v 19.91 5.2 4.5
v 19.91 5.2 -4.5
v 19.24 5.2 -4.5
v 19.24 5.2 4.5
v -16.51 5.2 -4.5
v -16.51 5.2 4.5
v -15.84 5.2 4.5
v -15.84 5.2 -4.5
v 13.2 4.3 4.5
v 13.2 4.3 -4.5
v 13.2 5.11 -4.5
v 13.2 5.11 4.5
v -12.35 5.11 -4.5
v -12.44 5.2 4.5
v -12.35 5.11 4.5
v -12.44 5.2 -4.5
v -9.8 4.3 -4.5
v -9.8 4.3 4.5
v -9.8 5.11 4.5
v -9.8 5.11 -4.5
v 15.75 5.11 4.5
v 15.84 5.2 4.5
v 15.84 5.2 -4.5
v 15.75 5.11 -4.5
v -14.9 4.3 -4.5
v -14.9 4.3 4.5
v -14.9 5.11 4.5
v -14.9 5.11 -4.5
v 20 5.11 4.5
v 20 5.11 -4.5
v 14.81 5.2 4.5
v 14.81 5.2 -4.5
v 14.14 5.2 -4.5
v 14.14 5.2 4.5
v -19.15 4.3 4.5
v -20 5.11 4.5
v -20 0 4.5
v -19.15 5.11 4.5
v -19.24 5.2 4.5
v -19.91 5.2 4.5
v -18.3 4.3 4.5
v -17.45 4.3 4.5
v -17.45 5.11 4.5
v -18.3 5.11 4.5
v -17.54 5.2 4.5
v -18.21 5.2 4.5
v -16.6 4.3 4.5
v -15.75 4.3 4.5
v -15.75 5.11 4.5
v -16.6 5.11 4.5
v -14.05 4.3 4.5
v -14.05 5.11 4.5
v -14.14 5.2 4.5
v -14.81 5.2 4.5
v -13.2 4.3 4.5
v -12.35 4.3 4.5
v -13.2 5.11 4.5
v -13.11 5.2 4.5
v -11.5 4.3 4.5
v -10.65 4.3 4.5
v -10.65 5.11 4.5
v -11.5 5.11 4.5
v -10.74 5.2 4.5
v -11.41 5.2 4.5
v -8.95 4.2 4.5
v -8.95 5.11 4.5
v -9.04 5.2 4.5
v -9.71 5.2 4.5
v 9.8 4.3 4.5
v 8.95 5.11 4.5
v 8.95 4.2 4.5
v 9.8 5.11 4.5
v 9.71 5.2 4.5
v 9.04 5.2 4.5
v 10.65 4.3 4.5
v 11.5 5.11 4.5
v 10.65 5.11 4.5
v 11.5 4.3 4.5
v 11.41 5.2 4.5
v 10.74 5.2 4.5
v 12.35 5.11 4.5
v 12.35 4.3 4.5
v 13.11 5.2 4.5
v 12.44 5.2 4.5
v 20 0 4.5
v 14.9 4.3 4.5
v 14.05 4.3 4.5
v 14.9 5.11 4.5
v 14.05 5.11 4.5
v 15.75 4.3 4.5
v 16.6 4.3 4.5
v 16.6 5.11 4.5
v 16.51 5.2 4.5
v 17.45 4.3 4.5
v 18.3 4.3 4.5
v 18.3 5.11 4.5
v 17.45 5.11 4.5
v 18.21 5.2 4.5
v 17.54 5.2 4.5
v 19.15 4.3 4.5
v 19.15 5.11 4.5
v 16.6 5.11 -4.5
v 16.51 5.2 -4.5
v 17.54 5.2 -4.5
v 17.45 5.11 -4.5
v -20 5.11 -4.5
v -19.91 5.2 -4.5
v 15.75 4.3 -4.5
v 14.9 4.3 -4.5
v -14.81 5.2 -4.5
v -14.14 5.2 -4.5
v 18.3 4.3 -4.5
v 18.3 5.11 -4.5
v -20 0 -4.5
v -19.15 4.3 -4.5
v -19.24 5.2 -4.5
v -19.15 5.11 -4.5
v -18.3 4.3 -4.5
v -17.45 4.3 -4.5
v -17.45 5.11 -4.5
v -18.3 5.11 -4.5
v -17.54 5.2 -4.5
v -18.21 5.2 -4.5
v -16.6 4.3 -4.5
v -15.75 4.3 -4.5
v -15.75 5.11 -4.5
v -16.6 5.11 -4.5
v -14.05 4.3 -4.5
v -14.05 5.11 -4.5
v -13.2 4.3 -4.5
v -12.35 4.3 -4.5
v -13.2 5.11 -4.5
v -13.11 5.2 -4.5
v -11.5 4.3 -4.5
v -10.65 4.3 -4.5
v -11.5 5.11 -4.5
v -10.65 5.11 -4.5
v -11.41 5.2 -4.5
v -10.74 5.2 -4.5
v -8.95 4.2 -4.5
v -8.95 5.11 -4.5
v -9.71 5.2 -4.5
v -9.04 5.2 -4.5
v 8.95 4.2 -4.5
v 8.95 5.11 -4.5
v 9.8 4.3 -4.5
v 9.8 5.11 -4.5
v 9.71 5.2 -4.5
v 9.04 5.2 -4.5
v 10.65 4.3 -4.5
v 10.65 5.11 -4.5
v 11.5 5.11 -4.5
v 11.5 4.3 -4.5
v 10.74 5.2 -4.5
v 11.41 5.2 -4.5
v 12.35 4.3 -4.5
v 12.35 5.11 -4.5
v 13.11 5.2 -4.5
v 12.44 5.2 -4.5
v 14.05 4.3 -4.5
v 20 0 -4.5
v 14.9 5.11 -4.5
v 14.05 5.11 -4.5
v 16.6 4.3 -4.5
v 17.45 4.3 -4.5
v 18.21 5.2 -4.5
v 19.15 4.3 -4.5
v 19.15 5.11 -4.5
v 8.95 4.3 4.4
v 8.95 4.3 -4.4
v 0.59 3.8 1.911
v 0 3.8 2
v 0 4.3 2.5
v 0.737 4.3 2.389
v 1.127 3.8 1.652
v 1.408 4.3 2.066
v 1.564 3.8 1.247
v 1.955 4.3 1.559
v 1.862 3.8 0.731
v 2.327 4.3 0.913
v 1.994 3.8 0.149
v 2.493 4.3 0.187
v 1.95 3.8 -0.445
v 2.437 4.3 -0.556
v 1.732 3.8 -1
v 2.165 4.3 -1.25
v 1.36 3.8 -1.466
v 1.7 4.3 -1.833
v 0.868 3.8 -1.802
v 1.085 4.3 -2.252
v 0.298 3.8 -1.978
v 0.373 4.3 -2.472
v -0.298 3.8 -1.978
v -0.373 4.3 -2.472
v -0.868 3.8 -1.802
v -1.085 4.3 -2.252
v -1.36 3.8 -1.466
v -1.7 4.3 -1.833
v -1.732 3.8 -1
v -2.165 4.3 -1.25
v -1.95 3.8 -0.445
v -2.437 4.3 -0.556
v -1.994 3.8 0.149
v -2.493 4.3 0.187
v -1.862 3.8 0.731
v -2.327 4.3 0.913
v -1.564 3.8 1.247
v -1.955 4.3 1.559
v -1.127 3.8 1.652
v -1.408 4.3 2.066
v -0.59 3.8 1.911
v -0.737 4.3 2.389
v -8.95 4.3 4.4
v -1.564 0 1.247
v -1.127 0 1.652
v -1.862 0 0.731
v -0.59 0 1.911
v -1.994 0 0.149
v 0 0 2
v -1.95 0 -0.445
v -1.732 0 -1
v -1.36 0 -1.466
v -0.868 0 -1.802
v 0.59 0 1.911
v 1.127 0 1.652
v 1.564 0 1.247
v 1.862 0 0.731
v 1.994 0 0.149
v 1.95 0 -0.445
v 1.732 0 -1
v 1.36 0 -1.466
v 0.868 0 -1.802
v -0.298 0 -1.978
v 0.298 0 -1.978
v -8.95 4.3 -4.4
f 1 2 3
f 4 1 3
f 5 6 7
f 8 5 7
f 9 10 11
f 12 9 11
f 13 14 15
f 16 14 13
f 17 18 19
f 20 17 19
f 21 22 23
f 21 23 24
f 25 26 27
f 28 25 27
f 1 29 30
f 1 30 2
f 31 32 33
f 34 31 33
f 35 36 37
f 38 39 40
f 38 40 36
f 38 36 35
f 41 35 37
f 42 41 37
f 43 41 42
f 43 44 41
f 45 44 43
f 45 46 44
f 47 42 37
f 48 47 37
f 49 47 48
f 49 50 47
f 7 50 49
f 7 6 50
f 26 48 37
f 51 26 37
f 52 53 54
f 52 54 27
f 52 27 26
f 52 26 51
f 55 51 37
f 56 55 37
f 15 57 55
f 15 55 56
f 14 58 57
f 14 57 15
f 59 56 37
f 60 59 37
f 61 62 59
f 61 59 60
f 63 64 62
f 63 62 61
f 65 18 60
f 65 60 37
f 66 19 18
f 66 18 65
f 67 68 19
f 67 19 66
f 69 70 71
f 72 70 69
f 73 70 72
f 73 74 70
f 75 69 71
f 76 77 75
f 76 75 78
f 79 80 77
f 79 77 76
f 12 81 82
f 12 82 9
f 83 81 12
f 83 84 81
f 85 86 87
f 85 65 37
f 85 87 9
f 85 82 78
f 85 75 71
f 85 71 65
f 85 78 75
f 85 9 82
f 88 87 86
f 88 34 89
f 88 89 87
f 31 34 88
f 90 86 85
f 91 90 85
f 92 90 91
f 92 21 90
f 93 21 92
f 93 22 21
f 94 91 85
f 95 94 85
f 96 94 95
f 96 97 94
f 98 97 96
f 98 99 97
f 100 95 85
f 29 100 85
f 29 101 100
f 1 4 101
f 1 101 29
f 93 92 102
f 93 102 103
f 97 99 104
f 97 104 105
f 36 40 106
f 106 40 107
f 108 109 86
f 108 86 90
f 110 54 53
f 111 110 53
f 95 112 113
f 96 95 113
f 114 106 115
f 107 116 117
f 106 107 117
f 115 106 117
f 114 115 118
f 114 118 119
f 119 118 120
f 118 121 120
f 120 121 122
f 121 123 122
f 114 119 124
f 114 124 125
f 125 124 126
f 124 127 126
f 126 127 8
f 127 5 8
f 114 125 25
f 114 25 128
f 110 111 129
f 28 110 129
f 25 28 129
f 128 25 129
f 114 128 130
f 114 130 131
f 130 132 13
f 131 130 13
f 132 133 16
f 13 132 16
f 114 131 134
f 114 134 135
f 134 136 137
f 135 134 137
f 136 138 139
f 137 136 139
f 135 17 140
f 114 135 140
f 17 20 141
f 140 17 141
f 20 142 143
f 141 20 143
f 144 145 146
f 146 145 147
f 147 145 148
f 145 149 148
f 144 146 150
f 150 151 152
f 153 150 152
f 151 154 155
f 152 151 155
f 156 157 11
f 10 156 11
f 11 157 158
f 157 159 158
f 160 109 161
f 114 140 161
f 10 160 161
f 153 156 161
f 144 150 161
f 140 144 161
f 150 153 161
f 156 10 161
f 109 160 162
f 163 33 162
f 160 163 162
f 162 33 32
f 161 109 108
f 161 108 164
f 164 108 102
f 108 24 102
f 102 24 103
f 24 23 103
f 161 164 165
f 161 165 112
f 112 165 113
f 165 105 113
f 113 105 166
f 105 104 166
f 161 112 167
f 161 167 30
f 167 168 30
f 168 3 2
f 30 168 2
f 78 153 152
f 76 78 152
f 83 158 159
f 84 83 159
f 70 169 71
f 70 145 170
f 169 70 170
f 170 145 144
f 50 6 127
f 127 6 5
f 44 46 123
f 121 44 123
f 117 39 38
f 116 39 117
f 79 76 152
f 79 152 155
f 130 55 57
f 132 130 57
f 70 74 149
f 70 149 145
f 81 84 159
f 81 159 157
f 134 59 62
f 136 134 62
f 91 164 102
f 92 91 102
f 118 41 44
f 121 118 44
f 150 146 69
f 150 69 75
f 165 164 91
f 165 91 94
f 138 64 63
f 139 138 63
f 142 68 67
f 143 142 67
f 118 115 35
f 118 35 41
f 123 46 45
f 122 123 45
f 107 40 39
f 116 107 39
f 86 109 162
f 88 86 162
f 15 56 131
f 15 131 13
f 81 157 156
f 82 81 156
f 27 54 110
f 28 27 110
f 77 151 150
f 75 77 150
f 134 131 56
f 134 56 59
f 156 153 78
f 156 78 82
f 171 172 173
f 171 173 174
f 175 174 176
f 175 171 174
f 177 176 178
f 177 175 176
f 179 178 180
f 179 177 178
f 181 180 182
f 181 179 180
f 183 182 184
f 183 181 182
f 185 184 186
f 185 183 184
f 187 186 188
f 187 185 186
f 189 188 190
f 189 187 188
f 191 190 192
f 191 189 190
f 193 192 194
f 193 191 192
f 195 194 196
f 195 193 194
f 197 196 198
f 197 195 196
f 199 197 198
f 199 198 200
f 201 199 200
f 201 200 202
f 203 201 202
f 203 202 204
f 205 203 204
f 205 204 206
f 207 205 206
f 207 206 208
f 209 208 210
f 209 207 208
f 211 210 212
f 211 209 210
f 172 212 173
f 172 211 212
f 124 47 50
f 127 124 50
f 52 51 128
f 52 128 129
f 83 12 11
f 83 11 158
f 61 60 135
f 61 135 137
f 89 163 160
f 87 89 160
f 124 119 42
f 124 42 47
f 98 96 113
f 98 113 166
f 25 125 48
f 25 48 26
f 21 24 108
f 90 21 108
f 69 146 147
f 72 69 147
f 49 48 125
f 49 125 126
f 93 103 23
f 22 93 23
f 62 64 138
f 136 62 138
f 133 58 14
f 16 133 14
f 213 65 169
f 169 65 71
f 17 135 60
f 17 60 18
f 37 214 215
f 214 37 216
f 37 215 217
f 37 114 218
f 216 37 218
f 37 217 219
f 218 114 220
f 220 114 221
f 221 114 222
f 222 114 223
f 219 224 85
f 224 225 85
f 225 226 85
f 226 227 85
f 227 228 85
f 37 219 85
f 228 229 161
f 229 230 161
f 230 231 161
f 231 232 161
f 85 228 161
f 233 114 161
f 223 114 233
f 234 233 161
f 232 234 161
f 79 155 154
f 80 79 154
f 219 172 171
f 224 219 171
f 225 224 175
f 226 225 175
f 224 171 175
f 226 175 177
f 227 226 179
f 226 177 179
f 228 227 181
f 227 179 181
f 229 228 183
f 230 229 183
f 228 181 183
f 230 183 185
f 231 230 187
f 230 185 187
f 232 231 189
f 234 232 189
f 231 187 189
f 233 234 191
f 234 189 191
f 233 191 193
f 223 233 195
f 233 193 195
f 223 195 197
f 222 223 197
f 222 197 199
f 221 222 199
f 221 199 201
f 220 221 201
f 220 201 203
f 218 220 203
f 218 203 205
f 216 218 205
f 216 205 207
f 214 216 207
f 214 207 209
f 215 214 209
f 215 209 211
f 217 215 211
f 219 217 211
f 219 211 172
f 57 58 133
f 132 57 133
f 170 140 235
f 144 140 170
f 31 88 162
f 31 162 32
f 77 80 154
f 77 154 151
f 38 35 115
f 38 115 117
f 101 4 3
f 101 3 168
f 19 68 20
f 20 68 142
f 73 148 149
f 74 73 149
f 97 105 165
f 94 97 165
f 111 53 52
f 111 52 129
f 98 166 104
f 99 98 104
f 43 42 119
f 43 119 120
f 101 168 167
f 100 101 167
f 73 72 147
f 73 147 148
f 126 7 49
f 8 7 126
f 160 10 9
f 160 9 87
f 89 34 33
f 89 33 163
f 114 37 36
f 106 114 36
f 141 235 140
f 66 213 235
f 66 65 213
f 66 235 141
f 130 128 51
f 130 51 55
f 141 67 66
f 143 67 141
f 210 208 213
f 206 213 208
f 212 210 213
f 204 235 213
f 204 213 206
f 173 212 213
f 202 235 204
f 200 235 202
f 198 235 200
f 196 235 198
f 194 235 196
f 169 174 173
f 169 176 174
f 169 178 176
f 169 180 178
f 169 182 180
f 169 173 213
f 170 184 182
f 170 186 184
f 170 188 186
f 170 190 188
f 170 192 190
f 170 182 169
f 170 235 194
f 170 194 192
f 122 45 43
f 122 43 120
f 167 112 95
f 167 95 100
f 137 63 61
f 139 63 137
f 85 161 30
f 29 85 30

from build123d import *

# Parameters (mm, degrees)
SKETCH_1_W                          = 40
SKETCH_1_H                          = 9
EXTRUDE_1_DEPTH                     = 4.3
SKETCH_2_W                          = 0.85
SKETCH_2_H                          = 0.9
EXTRUDE_2_DEPTH                     = 9
CHAMFER_1_SIZE                      = 0.09
PATTERN_LINEAR_10_COUNT             = 7
PATTERN_LINEAR_10_PITCH             = 1.7
CHAMFER_1_OF_PATTERN_LINEAR_10_SIZE = 0.09
MIRROR_START                        = -4.5
MIRROR_3_DEPTH                      = 9
SKETCH_4_R                          = 2
CUT_EXTRUDE_1_DEPTH                 = 21.946121359
CHAMFER_2_SIZE                      = 0.5
CHAMFER_3_SIZE                      = 0.1


# Read off the part's stored shape, not the designer's step: 鏡射3
with BuildPart() as part:
    # 草圖1 → 填料-伸長1 (new body)
    with BuildSketch(Plane(origin=(0, 0, 0), x_dir=(1, 0, 0), z_dir=(0, 1, 0))):
        Rectangle(SKETCH_1_W, SKETCH_1_H)
    extrude(amount=EXTRUDE_1_DEPTH)

    # 草圖2 → 填料-伸長2 (add)
    with BuildSketch(Plane.XY.offset(4.5)):
        with Locations((-19.575, 4.75)):
            Rectangle(SKETCH_2_W, SKETCH_2_H)
    extrude_2 = extrude(amount=-EXTRUDE_2_DEPTH)

    # 導角1
    chamfer_1_edges = [part.edges().sort_by_distance(p)[0] for p in [
        (-20, 5.2, 0),
        (-19.15, 5.2, 0),
    ]]
    chamfer(chamfer_1_edges, length=CHAMFER_1_SIZE)

    # 直線複製排列10: 填料-伸長2 ×7
    with Locations(*[(i * PATTERN_LINEAR_10_PITCH, 0, 0) for i in range(1, PATTERN_LINEAR_10_COUNT)]):
        add(extrude_2)

    # 導角1 of 直線複製排列10
    chamfer_1_of_pattern_linear_10_edges = [part.edges().sort_by_distance(p)[0] for p in [
        (-18.3, 5.2, 0),
        (-17.45, 5.2, 0),
        (-16.6, 5.2, 0),
        (-15.75, 5.2, 0),
        (-14.9, 5.2, 0),
        (-14.05, 5.2, 0),
        (-13.2, 5.2, 0),
        (-12.35, 5.2, 0),
        (-11.5, 5.2, 0),
        (-10.65, 5.2, 0),
        (-9.8, 5.2, 0),
        (-8.95, 5.2, 0),
    ]]
    chamfer(chamfer_1_of_pattern_linear_10_edges, length=CHAMFER_1_OF_PATTERN_LINEAR_10_SIZE)

    # 鏡射3 outline → 鏡射3 (add)
    with BuildSketch(Plane.XY.offset(MIRROR_START)):
        Polygon((8.95, 4.3), (9.8, 4.3), (9.8, 5.11), (9.71, 5.2), (9.04, 5.2), (8.95, 5.11), align=None)
        Polygon((10.65, 4.3), (11.5, 4.3), (11.5, 5.11), (11.41, 5.2), (10.74, 5.2), (10.65, 5.11), align=None)
        Polygon((12.35, 4.3), (13.2, 4.3), (13.2, 5.11), (13.11, 5.2), (12.44, 5.2), (12.35, 5.11), align=None)
        Polygon((14.05, 4.3), (14.9, 4.3), (14.9, 5.11), (14.81, 5.2), (14.14, 5.2), (14.05, 5.11), align=None)
        Polygon((15.75, 4.3), (16.6, 4.3), (16.6, 5.11), (16.51, 5.2), (15.84, 5.2), (15.75, 5.11), align=None)
        Polygon((17.45, 4.3), (18.3, 4.3), (18.3, 5.11), (18.21, 5.2), (17.54, 5.2), (17.45, 5.11), align=None)
        Polygon((20, 4.3), (20, 5.11), (19.91, 5.2), (19.24, 5.2), (19.15, 5.11), (19.15, 4.3), align=None)
    extrude(amount=MIRROR_3_DEPTH)

    # 草圖4 → 除料-伸長1 (cut, through all)
    with BuildSketch(Plane(origin=(0, 4.3, 0), x_dir=(1, 0, 0), z_dir=(0, 1, 0))):
        with Locations(Location((0, 0, 0), (0, 0, 270))):
            Circle(SKETCH_4_R)
    extrude(amount=-CUT_EXTRUDE_1_DEPTH, mode=Mode.SUBTRACT)

    # 導角2
    chamfer_2_edges = [part.edges().sort_by_distance(p)[0] for p in [
        (0, 4.3, -2),
    ]]
    chamfer(chamfer_2_edges, length=CHAMFER_2_SIZE)

    # 導角3
    chamfer_3_edges = [part.edges().sort_by_distance(p)[0] for p in [
        (0, 4.3, -4.5),
        (0, 4.3, 4.5),
    ]]
    chamfer(chamfer_3_edges, length=CHAMFER_3_SIZE)


solid = part.part
